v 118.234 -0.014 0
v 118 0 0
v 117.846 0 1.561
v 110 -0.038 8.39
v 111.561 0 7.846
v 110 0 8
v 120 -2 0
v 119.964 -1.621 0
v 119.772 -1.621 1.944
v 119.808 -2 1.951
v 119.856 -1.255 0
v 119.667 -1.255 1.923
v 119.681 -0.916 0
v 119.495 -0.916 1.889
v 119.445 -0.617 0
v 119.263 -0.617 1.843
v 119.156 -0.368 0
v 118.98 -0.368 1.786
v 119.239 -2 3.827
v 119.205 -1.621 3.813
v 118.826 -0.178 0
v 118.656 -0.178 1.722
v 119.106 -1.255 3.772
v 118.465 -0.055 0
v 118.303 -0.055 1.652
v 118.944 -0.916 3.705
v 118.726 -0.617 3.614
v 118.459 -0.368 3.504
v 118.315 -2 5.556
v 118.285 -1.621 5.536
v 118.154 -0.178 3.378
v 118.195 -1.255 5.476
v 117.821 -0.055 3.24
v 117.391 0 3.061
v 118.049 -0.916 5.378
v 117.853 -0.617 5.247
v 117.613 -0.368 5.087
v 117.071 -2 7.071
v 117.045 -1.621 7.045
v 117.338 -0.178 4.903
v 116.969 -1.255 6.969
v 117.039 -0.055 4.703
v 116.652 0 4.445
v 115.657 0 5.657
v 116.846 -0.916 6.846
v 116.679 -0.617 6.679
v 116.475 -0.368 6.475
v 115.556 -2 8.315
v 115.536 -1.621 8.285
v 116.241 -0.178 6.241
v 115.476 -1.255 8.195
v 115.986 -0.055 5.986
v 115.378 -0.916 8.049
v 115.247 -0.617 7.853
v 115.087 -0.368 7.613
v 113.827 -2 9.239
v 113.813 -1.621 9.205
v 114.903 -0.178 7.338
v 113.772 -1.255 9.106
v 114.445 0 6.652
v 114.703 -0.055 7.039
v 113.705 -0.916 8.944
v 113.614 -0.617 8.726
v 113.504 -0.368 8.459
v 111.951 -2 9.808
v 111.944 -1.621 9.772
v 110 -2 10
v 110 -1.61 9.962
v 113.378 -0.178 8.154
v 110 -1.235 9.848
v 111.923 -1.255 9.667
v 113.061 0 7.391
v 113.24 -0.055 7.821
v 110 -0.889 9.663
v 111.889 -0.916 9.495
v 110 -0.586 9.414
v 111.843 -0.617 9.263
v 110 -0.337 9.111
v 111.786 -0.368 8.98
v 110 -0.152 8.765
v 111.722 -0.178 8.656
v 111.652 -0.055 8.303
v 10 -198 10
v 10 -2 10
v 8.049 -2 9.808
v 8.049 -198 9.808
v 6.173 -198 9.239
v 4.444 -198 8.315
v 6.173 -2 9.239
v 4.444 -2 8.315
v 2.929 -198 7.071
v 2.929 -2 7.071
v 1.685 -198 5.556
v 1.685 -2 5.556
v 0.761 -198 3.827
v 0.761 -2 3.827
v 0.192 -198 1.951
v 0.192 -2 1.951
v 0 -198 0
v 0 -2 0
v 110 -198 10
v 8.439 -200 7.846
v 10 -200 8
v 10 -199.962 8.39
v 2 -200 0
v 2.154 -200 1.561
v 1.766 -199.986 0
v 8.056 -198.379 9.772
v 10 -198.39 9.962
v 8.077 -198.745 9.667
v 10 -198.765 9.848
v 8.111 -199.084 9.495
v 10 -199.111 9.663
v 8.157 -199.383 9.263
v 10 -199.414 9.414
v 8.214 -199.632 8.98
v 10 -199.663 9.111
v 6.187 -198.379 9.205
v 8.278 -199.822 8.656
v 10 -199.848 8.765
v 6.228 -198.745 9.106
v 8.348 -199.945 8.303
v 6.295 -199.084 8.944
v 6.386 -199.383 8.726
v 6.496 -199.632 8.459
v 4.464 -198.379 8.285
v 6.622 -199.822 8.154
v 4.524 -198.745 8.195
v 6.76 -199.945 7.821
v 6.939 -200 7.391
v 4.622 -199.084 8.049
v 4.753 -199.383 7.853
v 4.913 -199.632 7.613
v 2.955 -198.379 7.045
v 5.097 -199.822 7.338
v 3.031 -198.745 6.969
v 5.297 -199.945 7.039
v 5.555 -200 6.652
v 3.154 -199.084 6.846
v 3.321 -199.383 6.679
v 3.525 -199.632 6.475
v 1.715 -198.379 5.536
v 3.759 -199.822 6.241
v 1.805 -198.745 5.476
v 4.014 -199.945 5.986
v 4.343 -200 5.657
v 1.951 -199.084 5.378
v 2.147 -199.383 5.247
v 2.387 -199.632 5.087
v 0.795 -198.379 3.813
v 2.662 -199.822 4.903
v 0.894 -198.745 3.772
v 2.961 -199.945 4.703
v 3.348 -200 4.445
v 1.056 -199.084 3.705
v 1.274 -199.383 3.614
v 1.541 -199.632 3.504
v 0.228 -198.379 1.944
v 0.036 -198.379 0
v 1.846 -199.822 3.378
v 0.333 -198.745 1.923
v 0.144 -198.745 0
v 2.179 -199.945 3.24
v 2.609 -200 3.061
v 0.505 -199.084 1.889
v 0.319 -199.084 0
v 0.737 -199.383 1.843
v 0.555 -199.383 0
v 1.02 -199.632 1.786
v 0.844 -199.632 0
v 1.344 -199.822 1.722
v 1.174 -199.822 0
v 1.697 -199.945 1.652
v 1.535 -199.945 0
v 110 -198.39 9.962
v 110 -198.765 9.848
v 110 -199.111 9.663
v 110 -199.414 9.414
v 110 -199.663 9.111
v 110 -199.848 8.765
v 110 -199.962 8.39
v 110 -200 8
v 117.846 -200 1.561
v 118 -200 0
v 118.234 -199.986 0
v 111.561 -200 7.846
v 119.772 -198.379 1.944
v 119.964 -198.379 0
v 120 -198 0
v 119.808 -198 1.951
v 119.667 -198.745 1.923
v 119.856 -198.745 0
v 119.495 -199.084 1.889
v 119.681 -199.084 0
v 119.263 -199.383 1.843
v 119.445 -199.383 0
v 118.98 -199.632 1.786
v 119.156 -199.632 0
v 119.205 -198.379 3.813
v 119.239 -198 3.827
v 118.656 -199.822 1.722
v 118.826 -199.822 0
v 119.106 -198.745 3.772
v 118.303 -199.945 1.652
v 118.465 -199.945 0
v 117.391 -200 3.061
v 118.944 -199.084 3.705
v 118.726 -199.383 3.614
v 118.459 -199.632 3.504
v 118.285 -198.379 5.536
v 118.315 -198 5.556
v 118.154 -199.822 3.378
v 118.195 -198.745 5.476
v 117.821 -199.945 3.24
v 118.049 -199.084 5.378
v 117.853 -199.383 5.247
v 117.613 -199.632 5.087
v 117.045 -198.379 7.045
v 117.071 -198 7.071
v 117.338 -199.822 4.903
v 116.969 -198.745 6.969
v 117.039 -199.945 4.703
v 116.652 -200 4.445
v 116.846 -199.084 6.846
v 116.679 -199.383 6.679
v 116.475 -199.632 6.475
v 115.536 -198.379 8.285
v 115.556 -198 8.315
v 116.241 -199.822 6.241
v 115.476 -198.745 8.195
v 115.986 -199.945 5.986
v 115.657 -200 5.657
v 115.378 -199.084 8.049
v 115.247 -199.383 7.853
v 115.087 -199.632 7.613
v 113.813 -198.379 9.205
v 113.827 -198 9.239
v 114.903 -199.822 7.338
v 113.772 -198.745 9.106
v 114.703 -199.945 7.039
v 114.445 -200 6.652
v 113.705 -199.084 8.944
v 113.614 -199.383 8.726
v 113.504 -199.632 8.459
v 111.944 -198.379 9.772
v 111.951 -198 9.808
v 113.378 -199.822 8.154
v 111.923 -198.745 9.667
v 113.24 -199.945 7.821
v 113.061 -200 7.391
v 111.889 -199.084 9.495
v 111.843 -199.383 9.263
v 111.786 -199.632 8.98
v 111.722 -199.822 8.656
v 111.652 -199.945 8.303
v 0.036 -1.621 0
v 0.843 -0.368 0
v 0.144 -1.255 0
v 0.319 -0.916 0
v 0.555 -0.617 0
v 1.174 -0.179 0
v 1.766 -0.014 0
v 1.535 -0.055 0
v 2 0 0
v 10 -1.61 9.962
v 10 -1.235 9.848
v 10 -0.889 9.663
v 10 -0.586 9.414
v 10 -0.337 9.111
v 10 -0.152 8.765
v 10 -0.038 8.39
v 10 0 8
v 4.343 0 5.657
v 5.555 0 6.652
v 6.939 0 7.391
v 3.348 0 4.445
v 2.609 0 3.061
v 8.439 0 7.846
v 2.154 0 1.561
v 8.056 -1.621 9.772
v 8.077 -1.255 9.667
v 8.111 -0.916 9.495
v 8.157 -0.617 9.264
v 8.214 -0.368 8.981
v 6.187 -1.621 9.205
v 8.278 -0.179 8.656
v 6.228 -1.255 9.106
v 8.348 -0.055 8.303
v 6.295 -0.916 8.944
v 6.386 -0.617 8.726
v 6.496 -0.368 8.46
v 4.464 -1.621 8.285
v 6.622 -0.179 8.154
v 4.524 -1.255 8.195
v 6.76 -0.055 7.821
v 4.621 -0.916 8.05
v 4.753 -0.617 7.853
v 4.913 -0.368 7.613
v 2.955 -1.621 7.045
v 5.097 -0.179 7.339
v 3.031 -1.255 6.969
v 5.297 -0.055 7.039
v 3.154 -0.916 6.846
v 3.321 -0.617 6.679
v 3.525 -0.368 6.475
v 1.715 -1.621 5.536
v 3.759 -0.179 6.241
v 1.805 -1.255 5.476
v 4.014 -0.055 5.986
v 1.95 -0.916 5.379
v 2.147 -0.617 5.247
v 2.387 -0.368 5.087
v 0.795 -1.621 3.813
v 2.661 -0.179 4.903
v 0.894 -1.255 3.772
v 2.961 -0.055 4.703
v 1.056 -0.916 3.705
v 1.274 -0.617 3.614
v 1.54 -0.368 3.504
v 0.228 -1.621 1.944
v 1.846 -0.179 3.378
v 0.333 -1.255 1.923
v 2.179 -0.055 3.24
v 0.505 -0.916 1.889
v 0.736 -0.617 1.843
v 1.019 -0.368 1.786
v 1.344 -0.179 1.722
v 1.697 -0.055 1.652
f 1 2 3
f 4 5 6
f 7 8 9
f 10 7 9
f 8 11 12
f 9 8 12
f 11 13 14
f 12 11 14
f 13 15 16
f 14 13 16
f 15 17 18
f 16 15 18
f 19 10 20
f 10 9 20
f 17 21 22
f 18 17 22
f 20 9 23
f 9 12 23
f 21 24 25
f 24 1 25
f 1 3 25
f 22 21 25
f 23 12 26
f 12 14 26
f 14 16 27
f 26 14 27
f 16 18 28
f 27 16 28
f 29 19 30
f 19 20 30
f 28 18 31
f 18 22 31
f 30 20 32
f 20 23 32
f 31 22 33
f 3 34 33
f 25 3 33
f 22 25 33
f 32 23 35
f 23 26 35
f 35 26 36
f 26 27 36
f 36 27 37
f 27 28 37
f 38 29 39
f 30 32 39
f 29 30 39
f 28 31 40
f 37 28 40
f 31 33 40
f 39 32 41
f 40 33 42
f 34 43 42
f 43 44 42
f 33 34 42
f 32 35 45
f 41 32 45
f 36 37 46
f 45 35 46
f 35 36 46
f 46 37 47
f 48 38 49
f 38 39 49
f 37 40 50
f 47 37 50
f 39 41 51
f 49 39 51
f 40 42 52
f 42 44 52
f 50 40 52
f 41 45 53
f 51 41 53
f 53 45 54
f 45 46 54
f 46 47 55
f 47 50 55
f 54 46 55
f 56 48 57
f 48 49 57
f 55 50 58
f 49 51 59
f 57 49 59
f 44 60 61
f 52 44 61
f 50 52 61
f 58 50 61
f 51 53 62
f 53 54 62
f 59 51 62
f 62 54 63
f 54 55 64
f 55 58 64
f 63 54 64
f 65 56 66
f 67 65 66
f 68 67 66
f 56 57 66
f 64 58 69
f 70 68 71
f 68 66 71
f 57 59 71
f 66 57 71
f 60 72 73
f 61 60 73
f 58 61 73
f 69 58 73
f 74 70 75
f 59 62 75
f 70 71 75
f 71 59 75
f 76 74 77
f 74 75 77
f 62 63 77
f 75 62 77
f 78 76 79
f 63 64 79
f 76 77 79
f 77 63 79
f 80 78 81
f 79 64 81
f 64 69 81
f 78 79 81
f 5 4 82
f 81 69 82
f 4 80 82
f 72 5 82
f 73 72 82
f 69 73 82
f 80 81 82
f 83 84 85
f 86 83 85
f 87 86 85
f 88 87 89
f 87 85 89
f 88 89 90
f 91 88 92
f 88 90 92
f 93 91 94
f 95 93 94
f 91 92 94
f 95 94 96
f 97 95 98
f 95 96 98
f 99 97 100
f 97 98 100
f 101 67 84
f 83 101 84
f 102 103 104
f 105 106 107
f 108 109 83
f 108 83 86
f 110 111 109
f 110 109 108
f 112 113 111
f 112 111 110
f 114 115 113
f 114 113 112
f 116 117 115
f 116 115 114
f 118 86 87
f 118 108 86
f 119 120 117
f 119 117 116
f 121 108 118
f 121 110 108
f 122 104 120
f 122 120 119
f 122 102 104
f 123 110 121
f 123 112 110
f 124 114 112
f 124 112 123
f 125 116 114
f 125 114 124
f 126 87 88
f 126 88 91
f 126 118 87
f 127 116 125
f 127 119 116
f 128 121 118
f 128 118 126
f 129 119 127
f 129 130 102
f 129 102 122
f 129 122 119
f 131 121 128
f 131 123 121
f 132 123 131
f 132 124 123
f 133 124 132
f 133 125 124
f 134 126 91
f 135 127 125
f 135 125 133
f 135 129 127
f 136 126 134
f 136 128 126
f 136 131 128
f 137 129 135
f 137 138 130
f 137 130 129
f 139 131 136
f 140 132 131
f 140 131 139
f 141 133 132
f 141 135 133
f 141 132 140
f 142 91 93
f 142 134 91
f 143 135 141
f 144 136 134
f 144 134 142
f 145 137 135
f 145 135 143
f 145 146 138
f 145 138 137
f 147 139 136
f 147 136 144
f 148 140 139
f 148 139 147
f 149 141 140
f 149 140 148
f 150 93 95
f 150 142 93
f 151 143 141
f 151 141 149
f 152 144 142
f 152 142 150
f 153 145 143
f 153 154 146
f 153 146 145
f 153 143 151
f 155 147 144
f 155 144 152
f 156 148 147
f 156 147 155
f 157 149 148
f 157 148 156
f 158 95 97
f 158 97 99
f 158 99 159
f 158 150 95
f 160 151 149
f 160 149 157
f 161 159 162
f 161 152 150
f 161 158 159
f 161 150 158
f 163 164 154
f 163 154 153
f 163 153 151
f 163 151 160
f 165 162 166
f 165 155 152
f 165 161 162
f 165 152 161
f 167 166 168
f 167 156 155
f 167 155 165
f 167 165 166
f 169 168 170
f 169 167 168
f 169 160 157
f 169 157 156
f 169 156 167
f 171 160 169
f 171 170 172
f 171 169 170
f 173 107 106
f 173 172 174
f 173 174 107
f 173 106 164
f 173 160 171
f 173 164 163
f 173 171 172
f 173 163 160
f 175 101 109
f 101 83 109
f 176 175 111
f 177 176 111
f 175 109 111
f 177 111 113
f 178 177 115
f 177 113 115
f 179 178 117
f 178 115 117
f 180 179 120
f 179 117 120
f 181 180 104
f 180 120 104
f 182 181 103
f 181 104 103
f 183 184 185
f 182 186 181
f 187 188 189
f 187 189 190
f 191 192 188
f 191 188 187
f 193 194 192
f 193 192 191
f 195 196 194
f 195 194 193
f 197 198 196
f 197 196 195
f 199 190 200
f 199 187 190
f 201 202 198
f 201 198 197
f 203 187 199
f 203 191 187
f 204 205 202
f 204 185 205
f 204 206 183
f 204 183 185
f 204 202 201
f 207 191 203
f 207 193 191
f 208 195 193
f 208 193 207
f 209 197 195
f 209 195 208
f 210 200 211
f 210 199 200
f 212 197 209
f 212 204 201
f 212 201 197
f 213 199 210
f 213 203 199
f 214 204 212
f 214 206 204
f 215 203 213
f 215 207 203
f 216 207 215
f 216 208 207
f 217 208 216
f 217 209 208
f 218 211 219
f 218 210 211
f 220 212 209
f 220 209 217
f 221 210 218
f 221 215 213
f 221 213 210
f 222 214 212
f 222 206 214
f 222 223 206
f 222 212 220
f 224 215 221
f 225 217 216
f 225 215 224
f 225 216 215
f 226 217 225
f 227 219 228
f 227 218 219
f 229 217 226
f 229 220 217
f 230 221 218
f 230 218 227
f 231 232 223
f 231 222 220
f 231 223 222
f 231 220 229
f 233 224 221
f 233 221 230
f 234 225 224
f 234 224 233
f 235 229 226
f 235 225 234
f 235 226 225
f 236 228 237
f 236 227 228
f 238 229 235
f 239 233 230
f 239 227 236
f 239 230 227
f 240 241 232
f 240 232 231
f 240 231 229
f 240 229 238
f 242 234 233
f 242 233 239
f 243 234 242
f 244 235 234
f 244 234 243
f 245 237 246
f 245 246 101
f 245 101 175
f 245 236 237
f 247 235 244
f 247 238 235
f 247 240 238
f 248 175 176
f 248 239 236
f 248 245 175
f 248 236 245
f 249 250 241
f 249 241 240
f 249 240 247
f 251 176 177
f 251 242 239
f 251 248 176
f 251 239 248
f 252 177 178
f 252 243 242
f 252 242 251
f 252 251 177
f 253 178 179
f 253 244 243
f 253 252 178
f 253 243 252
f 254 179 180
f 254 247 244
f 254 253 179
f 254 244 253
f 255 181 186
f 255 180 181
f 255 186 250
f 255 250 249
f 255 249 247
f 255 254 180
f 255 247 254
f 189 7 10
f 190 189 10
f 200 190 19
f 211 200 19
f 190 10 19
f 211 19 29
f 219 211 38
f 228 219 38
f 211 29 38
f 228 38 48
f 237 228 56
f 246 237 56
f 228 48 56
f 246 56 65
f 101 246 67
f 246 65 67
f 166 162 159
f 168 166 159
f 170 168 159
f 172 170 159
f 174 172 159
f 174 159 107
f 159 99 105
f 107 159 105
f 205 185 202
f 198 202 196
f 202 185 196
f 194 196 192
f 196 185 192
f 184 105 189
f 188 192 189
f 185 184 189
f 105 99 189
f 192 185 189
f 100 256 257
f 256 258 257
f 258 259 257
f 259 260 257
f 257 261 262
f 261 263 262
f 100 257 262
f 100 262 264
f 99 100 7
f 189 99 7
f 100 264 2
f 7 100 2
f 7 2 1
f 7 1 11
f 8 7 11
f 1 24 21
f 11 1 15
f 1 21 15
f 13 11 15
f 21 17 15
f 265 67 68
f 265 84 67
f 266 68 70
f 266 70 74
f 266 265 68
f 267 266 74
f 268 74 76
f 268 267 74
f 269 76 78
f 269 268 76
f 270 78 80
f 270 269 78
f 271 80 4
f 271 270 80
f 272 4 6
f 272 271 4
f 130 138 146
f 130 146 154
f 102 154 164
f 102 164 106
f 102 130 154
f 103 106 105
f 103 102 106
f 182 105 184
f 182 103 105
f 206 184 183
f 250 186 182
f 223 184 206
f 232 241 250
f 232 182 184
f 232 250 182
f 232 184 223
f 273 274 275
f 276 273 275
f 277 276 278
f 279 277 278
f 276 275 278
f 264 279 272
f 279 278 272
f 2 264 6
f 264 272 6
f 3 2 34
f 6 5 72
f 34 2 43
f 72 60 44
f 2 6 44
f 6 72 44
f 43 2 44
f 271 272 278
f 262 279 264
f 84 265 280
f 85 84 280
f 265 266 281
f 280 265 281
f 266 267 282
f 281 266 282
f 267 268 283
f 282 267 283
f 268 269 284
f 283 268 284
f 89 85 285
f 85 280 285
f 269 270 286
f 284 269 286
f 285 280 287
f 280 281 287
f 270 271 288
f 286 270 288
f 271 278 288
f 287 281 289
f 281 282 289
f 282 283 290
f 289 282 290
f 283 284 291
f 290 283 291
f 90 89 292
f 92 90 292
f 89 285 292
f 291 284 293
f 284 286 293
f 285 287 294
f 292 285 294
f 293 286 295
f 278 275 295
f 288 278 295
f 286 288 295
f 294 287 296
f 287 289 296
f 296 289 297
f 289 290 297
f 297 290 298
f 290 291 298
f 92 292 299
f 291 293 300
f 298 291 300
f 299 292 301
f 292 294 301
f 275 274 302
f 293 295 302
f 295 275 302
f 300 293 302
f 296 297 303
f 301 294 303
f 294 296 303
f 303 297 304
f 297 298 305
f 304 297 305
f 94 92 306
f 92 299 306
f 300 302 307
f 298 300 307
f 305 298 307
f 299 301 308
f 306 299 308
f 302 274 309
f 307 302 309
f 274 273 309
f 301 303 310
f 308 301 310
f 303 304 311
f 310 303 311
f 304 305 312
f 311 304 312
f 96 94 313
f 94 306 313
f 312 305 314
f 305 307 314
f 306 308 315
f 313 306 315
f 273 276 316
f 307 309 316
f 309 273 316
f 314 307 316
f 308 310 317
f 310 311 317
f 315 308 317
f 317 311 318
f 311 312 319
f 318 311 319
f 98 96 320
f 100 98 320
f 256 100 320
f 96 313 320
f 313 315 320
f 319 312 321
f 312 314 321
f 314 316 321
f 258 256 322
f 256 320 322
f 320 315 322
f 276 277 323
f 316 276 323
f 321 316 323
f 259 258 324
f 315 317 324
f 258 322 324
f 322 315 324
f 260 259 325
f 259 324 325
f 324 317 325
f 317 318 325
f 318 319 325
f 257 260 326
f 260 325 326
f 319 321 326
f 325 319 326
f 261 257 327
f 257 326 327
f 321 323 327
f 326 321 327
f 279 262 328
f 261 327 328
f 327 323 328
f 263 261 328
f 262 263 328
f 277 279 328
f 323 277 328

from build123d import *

# Parameters (mm, degrees)
F1_DEPTH = 200
F2_R     = 2
F3_R     = 2


with BuildPart() as f1:
    # F0 (on Front) → F1 (new body)
    with BuildSketch(Plane.XZ):
        with BuildLine():
            ThreePointArc((10, 10), (2.928932, 7.071068), (0, 0))
            Line((0, 0), (120, 0))
            ThreePointArc((120, 0), (117.071068, 7.071068), (110, 10))
            Line((110, 10), (10, 10))
        make_face()
    extrude(amount=F1_DEPTH)

    # F2
    f2_edges = [f1.edges().sort_by_distance(p)[0] for p in [
        (60, -200, 10),
    ]]
    fillet(f2_edges, radius=F2_R)

    # F3
    f3_edges = [f1.edges().sort_by_distance(p)[0] for p in [
        (60, 0, 10),
    ]]
    fillet(f3_edges, radius=F3_R)


solid = f1.part
